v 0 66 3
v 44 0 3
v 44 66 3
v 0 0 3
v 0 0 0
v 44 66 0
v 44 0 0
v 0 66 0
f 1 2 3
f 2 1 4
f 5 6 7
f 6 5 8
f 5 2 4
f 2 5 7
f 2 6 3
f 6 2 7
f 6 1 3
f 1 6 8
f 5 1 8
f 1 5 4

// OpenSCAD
/* [Dimensions:] */

// Length of the compartment in mm
length = 44;

// Width of the compartment in mm
width = 66;

// Height of the compartment in mm
height = 3;

module spacer()
{
	cube([ length, width, height ]);
}

// Call the module to render the compartment with dividers
spacer();
